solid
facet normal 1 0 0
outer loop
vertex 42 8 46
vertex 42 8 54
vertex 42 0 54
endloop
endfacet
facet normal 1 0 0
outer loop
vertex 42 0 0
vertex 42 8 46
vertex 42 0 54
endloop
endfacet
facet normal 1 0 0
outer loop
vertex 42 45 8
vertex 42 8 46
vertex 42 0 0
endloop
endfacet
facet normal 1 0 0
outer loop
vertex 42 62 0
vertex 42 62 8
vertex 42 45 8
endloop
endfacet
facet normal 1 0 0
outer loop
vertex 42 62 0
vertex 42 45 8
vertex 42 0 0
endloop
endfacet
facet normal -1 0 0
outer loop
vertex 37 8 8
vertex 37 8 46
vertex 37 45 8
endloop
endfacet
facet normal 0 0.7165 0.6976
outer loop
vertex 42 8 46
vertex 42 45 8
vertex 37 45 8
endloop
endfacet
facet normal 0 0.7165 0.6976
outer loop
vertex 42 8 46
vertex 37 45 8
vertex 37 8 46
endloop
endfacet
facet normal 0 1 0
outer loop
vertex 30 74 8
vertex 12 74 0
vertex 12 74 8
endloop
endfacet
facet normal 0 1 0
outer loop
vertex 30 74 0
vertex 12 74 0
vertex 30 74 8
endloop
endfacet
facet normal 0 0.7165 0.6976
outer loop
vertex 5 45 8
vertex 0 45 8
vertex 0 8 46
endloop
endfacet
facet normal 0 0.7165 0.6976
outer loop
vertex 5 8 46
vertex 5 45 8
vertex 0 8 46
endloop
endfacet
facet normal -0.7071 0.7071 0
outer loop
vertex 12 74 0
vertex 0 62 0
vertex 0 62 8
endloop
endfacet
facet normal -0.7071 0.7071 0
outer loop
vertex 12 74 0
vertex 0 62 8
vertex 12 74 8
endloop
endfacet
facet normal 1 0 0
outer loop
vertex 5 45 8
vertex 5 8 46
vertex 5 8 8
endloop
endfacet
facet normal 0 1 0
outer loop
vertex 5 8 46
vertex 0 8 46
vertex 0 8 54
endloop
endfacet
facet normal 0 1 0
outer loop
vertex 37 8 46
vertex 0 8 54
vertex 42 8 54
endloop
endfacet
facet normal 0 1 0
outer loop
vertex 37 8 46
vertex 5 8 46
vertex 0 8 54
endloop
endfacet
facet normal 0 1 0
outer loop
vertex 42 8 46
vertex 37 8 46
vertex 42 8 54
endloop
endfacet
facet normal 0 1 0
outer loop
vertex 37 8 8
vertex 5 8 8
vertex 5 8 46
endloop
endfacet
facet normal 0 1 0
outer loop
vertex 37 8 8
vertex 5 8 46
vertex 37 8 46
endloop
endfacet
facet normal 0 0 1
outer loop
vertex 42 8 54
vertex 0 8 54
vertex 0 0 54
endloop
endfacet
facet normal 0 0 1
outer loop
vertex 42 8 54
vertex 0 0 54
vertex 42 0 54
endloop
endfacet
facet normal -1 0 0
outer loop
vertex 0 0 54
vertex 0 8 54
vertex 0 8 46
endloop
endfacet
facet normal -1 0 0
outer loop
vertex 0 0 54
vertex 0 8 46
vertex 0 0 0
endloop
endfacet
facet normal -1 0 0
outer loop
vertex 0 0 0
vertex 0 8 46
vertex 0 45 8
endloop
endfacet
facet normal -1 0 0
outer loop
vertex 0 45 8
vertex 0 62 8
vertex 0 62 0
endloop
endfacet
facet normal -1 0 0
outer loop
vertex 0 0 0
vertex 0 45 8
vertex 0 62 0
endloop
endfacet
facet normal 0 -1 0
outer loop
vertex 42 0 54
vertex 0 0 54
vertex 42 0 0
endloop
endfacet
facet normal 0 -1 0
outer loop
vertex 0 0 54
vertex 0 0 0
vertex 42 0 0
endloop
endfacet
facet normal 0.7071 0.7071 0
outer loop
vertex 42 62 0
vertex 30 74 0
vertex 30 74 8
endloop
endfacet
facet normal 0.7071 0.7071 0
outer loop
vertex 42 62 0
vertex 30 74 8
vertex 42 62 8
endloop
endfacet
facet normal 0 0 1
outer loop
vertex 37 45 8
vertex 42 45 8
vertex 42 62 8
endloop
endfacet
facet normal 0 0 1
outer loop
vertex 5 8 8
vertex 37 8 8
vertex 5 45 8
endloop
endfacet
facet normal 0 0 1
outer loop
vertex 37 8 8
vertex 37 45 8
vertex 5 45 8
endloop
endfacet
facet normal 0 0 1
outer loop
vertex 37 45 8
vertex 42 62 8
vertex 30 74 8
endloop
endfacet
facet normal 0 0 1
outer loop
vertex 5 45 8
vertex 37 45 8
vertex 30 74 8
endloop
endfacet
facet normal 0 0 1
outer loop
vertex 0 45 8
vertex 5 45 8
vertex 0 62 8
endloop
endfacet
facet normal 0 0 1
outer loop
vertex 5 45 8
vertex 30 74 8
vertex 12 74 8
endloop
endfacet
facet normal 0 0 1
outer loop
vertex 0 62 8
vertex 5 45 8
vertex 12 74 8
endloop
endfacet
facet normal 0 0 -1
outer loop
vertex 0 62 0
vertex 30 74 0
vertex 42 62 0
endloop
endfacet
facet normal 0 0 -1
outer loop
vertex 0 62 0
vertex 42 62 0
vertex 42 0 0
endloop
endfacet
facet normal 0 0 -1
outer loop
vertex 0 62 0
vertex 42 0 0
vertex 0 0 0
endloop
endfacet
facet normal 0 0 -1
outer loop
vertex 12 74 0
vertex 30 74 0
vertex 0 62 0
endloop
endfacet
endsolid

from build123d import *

# Parameters (mm, degrees)
BOSS_EXTRUDE1_DEPTH = 8
SKETCH2_W           = 42
SKETCH2_H           = 8
BOSS_EXTRUDE2_DEPTH = 46
BOSS_EXTRUDE3_DEPTH = 5


with BuildPart() as part:
    # Sketch1 → Boss-Extrude1 (new body)
    with BuildSketch(Plane.XY):
        Polygon((0, 0), (0, 62), (12, 74), (30, 74), (42, 62), (42, 0), align=None)
    extrude(amount=BOSS_EXTRUDE1_DEPTH)

    # Sketch2 → Boss-Extrude2 (add)
    with BuildSketch(Plane.XY.offset(8)):
        with Locations((21, 4)):
            Rectangle(SKETCH2_W, SKETCH2_H)
    extrude(amount=BOSS_EXTRUDE2_DEPTH)

    # Sketch3 → Boss-Extrude3 (add)
    with BuildSketch(Plane(origin=(42, 0, 0), x_dir=(0, 0, -1), z_dir=(1, 0, 0))):
        Polygon((-8, 8), (-8, 45), (-46, 8), align=None)
    extrude(amount=-BOSS_EXTRUDE3_DEPTH)

    # Mirror1: part across plane


with BuildPart() as part_1:
    add(part.part)
    add(part.part.mirror(Plane(origin=(21, 0, 0), x_dir=(0, 0, 1), z_dir=(1, 0, 0))))


solid = part_1.part
